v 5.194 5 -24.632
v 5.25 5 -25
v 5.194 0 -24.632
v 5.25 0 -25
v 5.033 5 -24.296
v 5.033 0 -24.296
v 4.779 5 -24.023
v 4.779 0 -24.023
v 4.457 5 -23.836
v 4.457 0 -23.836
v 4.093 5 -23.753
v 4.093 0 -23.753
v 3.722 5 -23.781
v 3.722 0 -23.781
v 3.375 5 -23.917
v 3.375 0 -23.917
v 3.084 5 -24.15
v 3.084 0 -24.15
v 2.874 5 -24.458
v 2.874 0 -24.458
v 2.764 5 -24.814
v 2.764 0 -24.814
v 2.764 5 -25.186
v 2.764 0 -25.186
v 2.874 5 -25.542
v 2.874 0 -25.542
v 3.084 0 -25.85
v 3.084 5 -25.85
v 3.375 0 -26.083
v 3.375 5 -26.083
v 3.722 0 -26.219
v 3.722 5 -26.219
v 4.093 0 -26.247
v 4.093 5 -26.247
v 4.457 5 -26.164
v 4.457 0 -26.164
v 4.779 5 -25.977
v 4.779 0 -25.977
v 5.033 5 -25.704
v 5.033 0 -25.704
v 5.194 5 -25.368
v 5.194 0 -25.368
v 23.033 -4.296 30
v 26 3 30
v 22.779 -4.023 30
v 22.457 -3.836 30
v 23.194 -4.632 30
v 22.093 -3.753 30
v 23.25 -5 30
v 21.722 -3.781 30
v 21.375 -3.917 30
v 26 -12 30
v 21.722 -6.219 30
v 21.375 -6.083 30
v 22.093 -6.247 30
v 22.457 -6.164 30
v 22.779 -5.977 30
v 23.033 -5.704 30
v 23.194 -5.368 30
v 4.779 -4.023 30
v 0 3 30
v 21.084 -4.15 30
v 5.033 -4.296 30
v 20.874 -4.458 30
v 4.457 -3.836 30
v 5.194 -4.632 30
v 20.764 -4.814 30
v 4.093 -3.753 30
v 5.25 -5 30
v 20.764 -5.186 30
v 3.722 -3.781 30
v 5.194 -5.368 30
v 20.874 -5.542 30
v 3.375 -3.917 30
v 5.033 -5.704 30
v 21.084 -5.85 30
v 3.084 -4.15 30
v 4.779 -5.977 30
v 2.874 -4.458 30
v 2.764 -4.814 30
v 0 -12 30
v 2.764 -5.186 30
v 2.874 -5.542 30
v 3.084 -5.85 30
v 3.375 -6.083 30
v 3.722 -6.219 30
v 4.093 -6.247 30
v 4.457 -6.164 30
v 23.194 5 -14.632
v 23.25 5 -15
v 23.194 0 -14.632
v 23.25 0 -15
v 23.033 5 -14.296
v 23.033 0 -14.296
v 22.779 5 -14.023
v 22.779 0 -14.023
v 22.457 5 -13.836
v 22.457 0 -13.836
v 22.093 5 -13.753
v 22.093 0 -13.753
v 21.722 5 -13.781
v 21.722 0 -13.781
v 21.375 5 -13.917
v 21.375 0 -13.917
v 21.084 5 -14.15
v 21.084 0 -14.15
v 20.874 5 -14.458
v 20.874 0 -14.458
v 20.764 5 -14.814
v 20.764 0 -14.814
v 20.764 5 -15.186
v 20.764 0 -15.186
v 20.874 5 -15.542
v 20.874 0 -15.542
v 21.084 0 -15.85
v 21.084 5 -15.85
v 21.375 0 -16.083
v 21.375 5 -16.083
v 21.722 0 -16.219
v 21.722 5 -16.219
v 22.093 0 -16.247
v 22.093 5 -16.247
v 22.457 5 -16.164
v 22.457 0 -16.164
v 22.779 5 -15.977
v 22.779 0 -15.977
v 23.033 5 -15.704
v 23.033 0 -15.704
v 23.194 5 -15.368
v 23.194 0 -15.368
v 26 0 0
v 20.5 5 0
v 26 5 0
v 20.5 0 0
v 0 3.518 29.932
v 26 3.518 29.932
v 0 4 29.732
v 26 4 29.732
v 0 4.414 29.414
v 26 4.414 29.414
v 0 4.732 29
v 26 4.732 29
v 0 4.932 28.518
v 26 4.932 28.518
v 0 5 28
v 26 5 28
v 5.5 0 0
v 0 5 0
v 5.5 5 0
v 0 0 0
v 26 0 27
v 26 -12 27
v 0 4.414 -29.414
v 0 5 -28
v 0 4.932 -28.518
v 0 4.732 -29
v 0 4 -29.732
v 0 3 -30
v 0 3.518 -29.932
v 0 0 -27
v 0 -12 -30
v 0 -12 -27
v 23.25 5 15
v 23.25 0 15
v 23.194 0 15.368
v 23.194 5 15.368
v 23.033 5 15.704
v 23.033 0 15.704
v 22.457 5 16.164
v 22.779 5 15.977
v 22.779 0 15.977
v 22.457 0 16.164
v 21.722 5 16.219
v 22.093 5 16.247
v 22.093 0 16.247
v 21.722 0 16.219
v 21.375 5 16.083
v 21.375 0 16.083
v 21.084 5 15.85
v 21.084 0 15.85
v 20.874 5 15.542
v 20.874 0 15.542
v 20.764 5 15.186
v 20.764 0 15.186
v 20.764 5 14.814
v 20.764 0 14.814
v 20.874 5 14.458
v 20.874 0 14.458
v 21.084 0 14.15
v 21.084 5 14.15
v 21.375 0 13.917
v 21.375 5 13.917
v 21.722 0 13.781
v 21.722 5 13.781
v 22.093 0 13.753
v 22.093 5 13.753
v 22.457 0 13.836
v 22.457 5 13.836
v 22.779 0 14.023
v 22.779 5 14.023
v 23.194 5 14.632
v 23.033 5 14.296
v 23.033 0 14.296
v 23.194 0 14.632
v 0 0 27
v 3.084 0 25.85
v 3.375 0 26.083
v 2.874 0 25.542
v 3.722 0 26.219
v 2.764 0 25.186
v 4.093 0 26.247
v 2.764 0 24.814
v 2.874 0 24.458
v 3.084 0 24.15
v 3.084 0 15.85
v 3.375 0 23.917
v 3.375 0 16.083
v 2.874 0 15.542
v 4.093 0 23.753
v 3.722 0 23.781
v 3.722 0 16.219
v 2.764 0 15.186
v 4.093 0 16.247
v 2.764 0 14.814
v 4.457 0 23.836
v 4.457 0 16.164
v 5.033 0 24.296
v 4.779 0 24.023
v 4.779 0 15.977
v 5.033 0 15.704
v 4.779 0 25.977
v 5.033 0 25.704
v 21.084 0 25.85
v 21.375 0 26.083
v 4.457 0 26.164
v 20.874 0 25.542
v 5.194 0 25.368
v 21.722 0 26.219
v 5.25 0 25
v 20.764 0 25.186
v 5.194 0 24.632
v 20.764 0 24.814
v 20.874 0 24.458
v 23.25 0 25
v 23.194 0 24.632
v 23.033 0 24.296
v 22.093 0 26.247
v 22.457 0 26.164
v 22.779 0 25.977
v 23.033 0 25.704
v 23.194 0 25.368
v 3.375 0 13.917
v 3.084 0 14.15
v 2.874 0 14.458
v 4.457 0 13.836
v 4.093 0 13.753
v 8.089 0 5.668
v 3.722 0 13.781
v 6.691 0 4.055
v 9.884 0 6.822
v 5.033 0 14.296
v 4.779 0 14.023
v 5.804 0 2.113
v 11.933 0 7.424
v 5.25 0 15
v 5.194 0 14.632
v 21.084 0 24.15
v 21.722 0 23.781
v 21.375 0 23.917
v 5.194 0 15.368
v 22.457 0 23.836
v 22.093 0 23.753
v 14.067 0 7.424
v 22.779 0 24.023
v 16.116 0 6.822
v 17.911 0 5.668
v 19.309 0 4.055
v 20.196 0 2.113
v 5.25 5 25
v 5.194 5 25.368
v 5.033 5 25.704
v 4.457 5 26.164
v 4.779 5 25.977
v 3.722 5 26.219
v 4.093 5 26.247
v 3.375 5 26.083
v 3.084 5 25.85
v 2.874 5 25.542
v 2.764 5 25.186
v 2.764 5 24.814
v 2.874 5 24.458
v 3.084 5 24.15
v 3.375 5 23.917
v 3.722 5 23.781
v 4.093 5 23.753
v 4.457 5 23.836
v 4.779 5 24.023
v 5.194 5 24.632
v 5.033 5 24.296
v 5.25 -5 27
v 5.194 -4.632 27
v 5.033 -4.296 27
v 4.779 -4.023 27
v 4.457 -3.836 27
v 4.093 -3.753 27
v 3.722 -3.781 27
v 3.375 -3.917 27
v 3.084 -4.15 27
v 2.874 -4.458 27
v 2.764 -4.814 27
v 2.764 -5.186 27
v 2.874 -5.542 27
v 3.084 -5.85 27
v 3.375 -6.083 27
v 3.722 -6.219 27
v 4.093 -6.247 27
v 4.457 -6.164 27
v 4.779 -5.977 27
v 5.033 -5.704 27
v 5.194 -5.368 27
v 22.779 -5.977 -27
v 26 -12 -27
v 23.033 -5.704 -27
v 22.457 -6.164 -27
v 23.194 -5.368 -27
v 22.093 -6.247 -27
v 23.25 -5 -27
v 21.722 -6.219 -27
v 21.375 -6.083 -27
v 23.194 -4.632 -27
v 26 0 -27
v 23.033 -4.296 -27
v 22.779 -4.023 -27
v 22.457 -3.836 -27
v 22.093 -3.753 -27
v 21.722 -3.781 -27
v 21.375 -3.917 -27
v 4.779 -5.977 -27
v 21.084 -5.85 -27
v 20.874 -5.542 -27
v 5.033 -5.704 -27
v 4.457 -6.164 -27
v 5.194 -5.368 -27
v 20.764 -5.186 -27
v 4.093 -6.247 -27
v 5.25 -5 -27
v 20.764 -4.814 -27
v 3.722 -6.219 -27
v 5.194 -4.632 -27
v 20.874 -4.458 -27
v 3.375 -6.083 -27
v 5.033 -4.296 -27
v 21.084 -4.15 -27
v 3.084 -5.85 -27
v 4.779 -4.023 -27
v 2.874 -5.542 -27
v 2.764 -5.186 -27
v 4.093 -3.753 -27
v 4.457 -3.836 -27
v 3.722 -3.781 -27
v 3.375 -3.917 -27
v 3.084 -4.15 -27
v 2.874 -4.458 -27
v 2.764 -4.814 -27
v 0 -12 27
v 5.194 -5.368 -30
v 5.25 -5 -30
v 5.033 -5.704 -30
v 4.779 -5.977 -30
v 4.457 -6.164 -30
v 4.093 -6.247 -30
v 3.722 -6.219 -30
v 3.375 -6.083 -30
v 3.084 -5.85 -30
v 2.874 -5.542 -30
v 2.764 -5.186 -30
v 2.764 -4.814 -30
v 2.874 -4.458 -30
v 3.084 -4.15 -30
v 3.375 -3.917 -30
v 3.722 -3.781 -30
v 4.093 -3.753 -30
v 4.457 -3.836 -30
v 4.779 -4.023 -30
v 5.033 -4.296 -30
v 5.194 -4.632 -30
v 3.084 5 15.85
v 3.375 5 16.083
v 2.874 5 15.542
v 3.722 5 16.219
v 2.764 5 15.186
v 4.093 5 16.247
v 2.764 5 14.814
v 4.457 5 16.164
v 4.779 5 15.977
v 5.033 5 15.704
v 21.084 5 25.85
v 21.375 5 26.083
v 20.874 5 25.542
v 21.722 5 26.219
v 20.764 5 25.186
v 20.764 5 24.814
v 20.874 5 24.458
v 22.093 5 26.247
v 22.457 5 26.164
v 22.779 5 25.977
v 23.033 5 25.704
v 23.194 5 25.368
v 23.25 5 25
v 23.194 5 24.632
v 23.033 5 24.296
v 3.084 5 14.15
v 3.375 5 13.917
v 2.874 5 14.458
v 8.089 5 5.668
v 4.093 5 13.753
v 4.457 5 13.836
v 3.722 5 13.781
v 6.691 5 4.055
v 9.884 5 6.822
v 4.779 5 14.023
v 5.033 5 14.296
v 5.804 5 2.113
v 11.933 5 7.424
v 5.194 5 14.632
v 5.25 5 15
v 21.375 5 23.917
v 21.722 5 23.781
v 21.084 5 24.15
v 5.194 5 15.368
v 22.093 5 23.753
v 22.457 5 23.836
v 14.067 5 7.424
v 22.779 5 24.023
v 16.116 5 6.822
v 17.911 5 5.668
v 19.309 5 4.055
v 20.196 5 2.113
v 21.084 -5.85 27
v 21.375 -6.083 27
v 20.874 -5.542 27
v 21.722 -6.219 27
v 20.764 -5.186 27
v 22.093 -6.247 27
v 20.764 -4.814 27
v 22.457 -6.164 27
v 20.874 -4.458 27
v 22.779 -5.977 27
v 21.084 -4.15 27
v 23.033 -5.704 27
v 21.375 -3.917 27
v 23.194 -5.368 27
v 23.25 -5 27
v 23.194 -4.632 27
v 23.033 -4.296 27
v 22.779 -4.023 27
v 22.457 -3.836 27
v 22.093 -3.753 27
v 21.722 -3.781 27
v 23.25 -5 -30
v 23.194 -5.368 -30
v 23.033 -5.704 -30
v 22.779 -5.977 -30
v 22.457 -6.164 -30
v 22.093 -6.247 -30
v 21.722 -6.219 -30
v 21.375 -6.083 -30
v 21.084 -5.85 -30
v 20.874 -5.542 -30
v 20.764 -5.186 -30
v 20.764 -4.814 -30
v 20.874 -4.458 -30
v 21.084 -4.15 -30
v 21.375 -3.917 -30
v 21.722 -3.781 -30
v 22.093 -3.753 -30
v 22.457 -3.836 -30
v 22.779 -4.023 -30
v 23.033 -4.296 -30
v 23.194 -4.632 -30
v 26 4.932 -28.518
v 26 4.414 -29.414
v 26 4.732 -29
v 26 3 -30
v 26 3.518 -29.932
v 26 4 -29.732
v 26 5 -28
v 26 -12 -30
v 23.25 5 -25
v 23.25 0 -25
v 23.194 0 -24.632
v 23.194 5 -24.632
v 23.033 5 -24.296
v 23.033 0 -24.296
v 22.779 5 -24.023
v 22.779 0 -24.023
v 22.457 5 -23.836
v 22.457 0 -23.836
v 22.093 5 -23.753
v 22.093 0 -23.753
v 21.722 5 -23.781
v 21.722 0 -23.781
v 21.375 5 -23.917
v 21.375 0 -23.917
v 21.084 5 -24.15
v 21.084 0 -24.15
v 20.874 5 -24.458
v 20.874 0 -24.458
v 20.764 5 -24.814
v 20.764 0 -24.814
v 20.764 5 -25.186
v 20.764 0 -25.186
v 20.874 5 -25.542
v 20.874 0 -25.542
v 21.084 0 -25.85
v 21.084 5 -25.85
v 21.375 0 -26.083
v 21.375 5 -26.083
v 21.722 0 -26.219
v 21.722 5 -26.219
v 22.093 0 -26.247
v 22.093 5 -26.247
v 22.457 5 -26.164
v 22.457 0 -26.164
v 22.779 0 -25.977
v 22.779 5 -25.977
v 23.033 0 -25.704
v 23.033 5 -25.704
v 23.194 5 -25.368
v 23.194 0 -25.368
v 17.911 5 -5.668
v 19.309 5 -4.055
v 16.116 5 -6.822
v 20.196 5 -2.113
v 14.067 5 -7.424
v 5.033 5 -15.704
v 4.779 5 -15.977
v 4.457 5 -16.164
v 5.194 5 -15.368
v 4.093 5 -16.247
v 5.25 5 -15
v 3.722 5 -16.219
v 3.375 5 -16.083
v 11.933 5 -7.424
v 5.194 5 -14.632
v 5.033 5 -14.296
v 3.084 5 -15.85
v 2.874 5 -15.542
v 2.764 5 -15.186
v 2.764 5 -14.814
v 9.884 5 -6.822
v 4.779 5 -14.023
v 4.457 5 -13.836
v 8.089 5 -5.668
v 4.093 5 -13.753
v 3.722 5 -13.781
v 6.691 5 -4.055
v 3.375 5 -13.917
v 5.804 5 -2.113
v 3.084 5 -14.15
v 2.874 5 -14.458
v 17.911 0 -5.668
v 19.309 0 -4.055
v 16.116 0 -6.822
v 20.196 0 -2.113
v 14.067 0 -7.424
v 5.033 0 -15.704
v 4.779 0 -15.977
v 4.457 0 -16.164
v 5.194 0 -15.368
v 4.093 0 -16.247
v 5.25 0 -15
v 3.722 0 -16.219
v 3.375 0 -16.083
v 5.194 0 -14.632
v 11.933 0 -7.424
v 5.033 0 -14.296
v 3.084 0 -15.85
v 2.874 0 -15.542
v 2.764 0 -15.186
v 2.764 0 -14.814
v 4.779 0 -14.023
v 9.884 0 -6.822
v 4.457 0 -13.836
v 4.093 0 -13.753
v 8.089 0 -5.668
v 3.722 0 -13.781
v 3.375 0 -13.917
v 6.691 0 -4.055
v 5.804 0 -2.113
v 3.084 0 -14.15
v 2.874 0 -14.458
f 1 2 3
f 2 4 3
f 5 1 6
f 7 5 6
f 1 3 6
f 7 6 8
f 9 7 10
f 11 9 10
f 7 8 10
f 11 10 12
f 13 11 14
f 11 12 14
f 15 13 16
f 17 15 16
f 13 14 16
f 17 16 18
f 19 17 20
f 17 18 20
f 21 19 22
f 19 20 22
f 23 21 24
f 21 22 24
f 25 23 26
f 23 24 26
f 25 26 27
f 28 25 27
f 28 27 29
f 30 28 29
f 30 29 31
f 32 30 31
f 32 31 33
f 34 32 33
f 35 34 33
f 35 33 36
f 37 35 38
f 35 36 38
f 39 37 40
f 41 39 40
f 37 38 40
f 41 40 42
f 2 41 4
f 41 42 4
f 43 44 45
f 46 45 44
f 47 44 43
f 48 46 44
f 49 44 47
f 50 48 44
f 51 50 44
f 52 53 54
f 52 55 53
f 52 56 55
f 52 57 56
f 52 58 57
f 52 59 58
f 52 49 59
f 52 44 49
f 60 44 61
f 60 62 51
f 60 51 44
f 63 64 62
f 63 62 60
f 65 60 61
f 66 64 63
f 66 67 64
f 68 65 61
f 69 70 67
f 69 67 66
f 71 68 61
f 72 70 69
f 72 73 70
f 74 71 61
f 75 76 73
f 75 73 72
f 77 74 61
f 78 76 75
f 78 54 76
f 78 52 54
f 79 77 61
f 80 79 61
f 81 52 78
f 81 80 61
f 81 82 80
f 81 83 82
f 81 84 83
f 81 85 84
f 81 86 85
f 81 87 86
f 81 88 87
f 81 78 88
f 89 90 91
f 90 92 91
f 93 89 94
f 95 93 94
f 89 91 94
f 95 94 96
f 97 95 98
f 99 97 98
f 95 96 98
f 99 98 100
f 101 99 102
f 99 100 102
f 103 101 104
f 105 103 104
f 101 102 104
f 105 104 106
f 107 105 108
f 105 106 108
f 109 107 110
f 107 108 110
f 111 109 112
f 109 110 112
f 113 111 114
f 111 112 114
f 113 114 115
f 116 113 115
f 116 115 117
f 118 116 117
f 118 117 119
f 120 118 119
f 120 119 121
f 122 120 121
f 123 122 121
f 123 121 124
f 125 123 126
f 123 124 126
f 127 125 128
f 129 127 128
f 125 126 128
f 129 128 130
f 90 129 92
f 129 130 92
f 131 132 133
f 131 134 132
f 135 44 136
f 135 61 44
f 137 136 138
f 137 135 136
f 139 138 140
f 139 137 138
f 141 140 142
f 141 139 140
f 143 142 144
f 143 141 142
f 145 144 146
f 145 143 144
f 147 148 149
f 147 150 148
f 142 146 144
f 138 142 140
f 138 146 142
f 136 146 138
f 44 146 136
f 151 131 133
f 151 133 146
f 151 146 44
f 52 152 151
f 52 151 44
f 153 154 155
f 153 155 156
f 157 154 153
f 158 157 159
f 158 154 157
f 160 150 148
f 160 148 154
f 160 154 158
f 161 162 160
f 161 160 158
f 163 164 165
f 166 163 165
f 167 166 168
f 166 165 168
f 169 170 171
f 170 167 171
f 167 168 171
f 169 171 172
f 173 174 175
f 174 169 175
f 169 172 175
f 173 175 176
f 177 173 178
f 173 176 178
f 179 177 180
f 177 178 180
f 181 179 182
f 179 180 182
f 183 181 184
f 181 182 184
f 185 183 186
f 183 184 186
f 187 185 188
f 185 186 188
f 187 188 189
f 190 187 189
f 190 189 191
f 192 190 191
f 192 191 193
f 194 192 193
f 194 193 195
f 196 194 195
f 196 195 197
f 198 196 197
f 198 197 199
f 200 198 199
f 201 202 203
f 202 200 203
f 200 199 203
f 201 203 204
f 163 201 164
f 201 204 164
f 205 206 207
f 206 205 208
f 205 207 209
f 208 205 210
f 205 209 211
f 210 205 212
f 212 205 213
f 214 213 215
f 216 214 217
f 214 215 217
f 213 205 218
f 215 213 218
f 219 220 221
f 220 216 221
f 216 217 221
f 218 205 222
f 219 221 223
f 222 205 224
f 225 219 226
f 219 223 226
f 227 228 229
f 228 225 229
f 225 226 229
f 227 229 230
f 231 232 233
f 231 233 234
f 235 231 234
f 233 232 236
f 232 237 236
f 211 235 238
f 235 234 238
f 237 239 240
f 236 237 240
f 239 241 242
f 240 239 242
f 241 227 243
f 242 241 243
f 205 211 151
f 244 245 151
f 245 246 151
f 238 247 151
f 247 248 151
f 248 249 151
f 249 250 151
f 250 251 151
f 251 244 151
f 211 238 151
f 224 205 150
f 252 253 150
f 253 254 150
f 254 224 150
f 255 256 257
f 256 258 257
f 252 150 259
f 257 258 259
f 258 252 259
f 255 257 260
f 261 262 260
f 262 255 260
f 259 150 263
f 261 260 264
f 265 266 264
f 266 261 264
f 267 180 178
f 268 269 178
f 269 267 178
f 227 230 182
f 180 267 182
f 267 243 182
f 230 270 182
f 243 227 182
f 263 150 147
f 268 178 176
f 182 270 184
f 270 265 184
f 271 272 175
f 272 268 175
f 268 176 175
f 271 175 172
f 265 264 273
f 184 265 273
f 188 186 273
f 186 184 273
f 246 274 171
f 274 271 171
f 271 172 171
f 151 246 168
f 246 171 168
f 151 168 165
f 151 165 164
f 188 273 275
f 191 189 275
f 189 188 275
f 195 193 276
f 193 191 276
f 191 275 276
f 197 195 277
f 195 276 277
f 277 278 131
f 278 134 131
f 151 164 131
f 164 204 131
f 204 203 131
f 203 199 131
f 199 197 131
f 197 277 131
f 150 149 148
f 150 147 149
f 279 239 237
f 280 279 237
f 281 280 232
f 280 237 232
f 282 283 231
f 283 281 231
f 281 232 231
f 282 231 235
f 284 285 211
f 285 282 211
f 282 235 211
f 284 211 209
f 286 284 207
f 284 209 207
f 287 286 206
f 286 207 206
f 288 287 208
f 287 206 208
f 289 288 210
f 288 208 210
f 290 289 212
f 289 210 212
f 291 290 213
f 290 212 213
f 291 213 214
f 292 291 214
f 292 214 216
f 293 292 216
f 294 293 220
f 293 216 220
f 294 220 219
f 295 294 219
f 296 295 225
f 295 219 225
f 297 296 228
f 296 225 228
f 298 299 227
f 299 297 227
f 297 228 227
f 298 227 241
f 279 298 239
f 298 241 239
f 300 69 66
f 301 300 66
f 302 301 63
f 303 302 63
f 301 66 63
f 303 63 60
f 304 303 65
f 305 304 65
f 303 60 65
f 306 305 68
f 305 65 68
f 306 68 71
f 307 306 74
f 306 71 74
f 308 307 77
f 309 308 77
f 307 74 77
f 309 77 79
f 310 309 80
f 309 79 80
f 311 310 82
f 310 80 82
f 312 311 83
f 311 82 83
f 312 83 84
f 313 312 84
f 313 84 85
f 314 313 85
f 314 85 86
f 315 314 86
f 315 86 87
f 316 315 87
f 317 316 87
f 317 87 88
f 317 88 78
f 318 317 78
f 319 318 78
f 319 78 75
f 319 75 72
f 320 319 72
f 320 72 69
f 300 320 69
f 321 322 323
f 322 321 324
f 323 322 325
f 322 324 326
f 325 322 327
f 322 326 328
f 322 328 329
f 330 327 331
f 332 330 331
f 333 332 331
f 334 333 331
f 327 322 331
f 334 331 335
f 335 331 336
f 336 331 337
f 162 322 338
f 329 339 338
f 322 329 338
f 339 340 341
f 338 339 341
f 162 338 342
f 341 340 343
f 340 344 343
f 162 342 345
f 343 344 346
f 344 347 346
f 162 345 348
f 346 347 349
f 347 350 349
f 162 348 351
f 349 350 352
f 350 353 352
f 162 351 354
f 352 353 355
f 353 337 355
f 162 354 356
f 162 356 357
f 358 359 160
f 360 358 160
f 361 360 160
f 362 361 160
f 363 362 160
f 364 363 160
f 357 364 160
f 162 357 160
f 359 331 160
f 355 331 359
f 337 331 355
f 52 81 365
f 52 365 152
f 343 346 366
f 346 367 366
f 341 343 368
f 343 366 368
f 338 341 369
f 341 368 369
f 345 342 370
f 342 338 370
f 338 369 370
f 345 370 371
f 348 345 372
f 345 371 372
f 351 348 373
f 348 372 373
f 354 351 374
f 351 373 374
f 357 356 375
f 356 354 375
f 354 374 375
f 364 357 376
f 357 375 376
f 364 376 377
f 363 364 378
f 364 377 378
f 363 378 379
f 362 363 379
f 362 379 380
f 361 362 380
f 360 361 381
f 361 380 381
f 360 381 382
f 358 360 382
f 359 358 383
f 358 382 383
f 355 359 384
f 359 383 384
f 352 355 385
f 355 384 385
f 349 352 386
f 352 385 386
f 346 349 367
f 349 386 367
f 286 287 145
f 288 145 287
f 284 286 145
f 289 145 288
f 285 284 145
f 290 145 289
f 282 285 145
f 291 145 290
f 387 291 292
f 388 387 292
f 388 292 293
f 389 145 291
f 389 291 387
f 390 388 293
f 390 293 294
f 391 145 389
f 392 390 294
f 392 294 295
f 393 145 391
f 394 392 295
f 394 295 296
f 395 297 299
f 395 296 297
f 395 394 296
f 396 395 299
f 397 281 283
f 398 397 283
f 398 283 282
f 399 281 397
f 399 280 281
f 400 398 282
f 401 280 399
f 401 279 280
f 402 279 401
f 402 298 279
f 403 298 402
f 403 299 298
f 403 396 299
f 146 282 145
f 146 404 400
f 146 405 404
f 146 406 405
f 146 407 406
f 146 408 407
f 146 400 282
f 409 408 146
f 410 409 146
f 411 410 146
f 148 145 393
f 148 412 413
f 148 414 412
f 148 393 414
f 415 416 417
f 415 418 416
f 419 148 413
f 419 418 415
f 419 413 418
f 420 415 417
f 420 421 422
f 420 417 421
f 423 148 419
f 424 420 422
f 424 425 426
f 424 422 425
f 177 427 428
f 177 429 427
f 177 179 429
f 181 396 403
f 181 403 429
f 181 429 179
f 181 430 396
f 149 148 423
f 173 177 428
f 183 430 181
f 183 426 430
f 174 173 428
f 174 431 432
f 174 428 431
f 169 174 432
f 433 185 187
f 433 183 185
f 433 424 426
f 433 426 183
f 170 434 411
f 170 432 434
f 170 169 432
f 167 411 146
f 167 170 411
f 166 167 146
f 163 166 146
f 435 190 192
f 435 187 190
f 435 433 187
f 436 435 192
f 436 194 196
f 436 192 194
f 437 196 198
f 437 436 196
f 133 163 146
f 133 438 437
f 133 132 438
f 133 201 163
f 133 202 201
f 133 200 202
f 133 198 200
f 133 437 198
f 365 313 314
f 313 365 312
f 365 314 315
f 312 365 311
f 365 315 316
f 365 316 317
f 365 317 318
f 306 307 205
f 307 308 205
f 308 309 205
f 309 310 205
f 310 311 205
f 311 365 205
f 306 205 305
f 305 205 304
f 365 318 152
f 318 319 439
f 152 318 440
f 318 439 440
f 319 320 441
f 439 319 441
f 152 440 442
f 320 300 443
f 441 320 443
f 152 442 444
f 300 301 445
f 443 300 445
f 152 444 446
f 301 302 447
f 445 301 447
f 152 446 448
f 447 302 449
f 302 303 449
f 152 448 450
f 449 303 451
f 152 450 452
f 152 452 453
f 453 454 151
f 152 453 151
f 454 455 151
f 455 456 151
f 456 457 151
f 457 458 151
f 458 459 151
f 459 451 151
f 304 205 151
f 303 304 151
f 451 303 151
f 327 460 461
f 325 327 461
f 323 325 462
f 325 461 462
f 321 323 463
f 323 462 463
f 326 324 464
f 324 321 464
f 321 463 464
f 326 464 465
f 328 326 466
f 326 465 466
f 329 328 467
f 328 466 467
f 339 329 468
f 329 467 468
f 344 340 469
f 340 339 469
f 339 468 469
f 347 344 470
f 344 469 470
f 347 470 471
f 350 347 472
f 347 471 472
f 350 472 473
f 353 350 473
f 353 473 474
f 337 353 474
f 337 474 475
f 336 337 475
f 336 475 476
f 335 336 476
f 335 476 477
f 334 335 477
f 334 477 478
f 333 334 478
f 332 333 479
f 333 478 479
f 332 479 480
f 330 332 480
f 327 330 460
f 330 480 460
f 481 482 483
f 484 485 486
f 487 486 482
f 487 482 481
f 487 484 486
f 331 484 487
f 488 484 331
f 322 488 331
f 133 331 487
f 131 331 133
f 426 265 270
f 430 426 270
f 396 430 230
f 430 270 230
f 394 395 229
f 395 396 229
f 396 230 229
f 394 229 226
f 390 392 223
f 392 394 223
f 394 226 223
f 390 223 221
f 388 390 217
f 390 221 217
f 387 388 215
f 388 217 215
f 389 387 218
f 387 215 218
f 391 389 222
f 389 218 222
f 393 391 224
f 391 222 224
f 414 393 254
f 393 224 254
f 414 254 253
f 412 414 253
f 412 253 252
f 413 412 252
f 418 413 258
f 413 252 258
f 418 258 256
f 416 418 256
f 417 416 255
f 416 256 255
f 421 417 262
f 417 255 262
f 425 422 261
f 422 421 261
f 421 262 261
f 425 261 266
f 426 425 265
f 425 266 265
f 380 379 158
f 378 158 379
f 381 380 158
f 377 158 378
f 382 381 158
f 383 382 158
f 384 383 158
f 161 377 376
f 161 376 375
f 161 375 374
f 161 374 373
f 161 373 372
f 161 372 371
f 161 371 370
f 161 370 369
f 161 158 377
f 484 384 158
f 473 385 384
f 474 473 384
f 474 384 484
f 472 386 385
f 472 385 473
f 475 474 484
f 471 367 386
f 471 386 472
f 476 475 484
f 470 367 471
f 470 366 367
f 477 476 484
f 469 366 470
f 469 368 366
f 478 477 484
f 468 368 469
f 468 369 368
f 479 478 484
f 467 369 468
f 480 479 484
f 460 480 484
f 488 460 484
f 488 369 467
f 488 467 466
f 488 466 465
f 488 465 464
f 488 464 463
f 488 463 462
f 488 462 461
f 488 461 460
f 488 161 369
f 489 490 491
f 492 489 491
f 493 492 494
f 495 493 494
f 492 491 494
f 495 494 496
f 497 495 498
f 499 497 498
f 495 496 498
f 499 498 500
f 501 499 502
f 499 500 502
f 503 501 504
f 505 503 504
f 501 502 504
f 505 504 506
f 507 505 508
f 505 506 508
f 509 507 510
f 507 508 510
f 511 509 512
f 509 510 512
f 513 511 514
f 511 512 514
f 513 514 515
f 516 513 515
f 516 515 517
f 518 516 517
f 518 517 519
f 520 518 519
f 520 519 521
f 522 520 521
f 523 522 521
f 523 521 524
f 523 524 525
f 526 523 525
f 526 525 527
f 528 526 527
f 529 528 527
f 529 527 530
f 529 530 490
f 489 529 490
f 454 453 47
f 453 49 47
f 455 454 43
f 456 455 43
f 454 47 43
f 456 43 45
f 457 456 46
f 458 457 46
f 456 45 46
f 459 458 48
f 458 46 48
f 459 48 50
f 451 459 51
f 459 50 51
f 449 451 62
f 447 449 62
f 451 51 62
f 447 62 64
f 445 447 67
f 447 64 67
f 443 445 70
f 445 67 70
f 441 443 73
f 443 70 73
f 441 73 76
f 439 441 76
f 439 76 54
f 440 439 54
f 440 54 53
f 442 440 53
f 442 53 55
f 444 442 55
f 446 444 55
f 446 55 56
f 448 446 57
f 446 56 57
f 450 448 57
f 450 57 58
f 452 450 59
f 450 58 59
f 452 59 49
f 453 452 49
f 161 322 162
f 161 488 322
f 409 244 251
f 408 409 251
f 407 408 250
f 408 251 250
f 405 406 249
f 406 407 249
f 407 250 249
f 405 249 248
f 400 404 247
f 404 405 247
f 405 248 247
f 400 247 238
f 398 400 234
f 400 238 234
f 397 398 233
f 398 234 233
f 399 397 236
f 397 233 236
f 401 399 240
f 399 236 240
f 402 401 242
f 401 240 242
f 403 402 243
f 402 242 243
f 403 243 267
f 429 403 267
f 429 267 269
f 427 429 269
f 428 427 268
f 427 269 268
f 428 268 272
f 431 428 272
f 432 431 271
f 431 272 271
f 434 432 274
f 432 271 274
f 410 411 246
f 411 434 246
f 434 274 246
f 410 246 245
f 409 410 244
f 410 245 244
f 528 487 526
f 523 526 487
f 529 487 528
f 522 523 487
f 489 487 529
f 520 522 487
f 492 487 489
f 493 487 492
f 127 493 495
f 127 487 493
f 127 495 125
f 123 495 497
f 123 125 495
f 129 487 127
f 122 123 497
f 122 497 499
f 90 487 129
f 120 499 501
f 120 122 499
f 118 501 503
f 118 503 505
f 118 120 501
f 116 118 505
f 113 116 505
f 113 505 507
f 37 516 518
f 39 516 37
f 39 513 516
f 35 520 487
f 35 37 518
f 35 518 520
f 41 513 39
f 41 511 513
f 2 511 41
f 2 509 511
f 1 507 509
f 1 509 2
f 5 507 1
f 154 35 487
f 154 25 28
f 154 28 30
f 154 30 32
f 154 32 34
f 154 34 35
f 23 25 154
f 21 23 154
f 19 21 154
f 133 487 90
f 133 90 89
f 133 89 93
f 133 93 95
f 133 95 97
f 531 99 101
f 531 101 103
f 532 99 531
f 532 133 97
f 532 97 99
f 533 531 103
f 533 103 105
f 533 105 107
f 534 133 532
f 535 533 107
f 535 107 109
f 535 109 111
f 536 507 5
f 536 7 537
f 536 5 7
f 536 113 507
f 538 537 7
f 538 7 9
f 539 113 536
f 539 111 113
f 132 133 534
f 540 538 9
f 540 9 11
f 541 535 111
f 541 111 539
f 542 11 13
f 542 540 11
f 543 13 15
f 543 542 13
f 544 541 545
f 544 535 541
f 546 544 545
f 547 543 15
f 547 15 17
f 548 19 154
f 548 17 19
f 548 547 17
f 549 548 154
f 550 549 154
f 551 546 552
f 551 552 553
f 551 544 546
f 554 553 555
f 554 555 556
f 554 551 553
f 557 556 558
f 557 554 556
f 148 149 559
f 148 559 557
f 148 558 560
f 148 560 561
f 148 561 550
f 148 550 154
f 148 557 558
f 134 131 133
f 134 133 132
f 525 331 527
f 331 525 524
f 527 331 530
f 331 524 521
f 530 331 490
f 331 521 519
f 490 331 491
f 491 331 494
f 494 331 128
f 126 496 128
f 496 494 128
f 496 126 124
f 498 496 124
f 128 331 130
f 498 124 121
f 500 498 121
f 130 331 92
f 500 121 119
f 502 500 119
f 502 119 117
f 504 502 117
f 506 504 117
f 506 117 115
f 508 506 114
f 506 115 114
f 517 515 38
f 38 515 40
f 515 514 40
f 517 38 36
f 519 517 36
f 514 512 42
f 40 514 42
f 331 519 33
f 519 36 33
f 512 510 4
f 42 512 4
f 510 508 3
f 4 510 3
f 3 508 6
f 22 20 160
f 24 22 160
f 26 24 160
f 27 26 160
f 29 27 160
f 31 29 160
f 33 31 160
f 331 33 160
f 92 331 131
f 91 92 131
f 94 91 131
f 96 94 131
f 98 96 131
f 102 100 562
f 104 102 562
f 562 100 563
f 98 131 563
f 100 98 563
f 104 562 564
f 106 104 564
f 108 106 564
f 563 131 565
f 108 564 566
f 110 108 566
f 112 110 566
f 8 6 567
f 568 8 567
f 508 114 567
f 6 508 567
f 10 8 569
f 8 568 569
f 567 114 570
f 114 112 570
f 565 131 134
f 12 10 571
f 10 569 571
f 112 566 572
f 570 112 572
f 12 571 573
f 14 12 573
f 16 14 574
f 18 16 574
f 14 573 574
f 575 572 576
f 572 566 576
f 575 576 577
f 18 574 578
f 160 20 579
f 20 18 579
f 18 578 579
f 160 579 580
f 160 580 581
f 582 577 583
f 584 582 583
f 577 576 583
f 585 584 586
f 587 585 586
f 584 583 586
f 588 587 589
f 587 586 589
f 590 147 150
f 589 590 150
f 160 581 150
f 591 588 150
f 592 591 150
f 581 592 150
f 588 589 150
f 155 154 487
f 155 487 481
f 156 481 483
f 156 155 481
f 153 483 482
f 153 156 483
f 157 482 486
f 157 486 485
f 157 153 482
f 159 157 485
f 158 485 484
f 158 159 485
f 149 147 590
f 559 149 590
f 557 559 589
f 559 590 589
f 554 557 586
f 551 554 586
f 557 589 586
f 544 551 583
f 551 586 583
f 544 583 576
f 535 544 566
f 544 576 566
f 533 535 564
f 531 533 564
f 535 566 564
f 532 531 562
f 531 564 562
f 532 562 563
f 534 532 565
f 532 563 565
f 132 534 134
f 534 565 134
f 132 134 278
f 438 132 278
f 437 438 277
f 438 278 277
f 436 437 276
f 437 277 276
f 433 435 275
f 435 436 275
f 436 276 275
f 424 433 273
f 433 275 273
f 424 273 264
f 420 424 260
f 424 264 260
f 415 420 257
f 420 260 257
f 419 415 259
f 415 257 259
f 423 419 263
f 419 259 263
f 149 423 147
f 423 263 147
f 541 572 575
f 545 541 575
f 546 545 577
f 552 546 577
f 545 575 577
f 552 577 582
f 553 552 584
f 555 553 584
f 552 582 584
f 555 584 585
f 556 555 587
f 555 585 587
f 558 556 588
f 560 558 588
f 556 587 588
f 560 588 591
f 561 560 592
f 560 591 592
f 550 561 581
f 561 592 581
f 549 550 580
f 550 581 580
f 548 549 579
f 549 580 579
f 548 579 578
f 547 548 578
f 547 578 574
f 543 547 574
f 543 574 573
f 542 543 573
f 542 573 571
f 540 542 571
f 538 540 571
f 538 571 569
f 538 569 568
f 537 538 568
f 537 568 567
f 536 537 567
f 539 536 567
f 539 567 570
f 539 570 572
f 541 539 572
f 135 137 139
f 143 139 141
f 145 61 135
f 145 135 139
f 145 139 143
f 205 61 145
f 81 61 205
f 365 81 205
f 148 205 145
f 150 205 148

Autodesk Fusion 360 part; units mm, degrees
sketch "Sketch1" plane through (0, 0, 0) normal (0, 1, 0) x (1, 0, 0)
  line L0 (0, 0) -> (26, 0)
  line L1 (26, 0) -> (26, -30)
  line L2 (26, -30) -> (0, -30)
  line L3 (0, -30) -> (0, 0)
  circle A0 centre (13, 0) radius 7.5
  circle A1 centre (22, -15) radius 1.25
  circle A2 centre (22, -25) radius 1.25
  circle A3 centre (4, -15) radius 1.25
  circle A4 centre (4, -25) radius 1.25
  dimension "d16" = 26
  dimension "d17" = 30
  dimension "d18" = 15
  dimension "d19" = 2.5
  dimension "d20" = 2.5
  dimension "d21" = 2.5
  dimension "d22" = 2.5
  dimension "d23" = 5
  dimension "d24" = 10
  dimension "d25" = 5
  dimension "d26" = 10
  dimension "d27" = 4
  dimension "d28" = 4
  dimension "d29" = 4
  dimension "d30" = 4
extrude "Extrude1" add sketch "Sketch1" along normal blind 5 contours L0 L1 L2 L3 A0 makes body 1
sketch "Sketch2" plane through (0, 0, 0) normal (0, -1, 0) x (1, 0, 0)
  circle A0 centre (4, 15) radius 1.25
  circle A1 centre (22, 25) radius 1.25
  circle A2 centre (4, 25) radius 1.25
  circle A3 centre (22, 15) radius 1.25
  line L0 (0, 30) -> (0, 0)
  line L1 (0, 0) -> (5.5, 0)
  arc A4 (20.5, 0) -> (5.5, 0) centre (13, 0) ccw
  line L2 (20.5, 0) -> (26, 0)
  line L3 (26, 0) -> (26, 30)
  line L4 (26, 30) -> (0, 30)
  line L5 (26, 30) -> (0, 30)
  line L6 (0, 30) -> (0, 27)
  line L7 (0, 27) -> (26, 27)
  line L8 (26, 27) -> (26, 30)
extrude "Extrude2" add sketch "Sketch2" along normal blind 12 contours L0 L3 L4 L5 L6 L7 L8 bodies 1
sketch "Sketch3" plane through (0, 0, 30) normal (0, 0, 1) x (1, 0, 0)
  line L0 (26, -12) -> (26, 5)
  line L1 (26, 5) -> (0, 5)
  line L2 (0, 5) -> (0, -12)
  line L3 (0, -12) -> (26, -12)
  circle A0 centre (4, -5) radius 1.25
  circle A1 centre (22, -5) radius 1.25
  dimension "d35" = 2.5
  dimension "d36" = 2.5
  dimension "d37" = 4
  dimension "d38" = 4
  dimension "d39" = 10
  dimension "d40" = 10
extrude "Extrude3" cut sketch "Sketch3" against normal blind 6 contours A0 | A1 bodies 1
ref_plane "WorkPlane1" through (26, 0, 0) normal (0, 0, -1) x (-1, 0, 0)
mirror "Mirror1" about plane through (26, 0, 0) normal (0, 0, -1) of bodies 1 makes body 2
fillet "Fillet1" radius 2 1 edges at (13, 5, -30) on bodies 2
fillet "Fillet2" radius 2 1 edges at (13, 5, 30) on bodies 1
